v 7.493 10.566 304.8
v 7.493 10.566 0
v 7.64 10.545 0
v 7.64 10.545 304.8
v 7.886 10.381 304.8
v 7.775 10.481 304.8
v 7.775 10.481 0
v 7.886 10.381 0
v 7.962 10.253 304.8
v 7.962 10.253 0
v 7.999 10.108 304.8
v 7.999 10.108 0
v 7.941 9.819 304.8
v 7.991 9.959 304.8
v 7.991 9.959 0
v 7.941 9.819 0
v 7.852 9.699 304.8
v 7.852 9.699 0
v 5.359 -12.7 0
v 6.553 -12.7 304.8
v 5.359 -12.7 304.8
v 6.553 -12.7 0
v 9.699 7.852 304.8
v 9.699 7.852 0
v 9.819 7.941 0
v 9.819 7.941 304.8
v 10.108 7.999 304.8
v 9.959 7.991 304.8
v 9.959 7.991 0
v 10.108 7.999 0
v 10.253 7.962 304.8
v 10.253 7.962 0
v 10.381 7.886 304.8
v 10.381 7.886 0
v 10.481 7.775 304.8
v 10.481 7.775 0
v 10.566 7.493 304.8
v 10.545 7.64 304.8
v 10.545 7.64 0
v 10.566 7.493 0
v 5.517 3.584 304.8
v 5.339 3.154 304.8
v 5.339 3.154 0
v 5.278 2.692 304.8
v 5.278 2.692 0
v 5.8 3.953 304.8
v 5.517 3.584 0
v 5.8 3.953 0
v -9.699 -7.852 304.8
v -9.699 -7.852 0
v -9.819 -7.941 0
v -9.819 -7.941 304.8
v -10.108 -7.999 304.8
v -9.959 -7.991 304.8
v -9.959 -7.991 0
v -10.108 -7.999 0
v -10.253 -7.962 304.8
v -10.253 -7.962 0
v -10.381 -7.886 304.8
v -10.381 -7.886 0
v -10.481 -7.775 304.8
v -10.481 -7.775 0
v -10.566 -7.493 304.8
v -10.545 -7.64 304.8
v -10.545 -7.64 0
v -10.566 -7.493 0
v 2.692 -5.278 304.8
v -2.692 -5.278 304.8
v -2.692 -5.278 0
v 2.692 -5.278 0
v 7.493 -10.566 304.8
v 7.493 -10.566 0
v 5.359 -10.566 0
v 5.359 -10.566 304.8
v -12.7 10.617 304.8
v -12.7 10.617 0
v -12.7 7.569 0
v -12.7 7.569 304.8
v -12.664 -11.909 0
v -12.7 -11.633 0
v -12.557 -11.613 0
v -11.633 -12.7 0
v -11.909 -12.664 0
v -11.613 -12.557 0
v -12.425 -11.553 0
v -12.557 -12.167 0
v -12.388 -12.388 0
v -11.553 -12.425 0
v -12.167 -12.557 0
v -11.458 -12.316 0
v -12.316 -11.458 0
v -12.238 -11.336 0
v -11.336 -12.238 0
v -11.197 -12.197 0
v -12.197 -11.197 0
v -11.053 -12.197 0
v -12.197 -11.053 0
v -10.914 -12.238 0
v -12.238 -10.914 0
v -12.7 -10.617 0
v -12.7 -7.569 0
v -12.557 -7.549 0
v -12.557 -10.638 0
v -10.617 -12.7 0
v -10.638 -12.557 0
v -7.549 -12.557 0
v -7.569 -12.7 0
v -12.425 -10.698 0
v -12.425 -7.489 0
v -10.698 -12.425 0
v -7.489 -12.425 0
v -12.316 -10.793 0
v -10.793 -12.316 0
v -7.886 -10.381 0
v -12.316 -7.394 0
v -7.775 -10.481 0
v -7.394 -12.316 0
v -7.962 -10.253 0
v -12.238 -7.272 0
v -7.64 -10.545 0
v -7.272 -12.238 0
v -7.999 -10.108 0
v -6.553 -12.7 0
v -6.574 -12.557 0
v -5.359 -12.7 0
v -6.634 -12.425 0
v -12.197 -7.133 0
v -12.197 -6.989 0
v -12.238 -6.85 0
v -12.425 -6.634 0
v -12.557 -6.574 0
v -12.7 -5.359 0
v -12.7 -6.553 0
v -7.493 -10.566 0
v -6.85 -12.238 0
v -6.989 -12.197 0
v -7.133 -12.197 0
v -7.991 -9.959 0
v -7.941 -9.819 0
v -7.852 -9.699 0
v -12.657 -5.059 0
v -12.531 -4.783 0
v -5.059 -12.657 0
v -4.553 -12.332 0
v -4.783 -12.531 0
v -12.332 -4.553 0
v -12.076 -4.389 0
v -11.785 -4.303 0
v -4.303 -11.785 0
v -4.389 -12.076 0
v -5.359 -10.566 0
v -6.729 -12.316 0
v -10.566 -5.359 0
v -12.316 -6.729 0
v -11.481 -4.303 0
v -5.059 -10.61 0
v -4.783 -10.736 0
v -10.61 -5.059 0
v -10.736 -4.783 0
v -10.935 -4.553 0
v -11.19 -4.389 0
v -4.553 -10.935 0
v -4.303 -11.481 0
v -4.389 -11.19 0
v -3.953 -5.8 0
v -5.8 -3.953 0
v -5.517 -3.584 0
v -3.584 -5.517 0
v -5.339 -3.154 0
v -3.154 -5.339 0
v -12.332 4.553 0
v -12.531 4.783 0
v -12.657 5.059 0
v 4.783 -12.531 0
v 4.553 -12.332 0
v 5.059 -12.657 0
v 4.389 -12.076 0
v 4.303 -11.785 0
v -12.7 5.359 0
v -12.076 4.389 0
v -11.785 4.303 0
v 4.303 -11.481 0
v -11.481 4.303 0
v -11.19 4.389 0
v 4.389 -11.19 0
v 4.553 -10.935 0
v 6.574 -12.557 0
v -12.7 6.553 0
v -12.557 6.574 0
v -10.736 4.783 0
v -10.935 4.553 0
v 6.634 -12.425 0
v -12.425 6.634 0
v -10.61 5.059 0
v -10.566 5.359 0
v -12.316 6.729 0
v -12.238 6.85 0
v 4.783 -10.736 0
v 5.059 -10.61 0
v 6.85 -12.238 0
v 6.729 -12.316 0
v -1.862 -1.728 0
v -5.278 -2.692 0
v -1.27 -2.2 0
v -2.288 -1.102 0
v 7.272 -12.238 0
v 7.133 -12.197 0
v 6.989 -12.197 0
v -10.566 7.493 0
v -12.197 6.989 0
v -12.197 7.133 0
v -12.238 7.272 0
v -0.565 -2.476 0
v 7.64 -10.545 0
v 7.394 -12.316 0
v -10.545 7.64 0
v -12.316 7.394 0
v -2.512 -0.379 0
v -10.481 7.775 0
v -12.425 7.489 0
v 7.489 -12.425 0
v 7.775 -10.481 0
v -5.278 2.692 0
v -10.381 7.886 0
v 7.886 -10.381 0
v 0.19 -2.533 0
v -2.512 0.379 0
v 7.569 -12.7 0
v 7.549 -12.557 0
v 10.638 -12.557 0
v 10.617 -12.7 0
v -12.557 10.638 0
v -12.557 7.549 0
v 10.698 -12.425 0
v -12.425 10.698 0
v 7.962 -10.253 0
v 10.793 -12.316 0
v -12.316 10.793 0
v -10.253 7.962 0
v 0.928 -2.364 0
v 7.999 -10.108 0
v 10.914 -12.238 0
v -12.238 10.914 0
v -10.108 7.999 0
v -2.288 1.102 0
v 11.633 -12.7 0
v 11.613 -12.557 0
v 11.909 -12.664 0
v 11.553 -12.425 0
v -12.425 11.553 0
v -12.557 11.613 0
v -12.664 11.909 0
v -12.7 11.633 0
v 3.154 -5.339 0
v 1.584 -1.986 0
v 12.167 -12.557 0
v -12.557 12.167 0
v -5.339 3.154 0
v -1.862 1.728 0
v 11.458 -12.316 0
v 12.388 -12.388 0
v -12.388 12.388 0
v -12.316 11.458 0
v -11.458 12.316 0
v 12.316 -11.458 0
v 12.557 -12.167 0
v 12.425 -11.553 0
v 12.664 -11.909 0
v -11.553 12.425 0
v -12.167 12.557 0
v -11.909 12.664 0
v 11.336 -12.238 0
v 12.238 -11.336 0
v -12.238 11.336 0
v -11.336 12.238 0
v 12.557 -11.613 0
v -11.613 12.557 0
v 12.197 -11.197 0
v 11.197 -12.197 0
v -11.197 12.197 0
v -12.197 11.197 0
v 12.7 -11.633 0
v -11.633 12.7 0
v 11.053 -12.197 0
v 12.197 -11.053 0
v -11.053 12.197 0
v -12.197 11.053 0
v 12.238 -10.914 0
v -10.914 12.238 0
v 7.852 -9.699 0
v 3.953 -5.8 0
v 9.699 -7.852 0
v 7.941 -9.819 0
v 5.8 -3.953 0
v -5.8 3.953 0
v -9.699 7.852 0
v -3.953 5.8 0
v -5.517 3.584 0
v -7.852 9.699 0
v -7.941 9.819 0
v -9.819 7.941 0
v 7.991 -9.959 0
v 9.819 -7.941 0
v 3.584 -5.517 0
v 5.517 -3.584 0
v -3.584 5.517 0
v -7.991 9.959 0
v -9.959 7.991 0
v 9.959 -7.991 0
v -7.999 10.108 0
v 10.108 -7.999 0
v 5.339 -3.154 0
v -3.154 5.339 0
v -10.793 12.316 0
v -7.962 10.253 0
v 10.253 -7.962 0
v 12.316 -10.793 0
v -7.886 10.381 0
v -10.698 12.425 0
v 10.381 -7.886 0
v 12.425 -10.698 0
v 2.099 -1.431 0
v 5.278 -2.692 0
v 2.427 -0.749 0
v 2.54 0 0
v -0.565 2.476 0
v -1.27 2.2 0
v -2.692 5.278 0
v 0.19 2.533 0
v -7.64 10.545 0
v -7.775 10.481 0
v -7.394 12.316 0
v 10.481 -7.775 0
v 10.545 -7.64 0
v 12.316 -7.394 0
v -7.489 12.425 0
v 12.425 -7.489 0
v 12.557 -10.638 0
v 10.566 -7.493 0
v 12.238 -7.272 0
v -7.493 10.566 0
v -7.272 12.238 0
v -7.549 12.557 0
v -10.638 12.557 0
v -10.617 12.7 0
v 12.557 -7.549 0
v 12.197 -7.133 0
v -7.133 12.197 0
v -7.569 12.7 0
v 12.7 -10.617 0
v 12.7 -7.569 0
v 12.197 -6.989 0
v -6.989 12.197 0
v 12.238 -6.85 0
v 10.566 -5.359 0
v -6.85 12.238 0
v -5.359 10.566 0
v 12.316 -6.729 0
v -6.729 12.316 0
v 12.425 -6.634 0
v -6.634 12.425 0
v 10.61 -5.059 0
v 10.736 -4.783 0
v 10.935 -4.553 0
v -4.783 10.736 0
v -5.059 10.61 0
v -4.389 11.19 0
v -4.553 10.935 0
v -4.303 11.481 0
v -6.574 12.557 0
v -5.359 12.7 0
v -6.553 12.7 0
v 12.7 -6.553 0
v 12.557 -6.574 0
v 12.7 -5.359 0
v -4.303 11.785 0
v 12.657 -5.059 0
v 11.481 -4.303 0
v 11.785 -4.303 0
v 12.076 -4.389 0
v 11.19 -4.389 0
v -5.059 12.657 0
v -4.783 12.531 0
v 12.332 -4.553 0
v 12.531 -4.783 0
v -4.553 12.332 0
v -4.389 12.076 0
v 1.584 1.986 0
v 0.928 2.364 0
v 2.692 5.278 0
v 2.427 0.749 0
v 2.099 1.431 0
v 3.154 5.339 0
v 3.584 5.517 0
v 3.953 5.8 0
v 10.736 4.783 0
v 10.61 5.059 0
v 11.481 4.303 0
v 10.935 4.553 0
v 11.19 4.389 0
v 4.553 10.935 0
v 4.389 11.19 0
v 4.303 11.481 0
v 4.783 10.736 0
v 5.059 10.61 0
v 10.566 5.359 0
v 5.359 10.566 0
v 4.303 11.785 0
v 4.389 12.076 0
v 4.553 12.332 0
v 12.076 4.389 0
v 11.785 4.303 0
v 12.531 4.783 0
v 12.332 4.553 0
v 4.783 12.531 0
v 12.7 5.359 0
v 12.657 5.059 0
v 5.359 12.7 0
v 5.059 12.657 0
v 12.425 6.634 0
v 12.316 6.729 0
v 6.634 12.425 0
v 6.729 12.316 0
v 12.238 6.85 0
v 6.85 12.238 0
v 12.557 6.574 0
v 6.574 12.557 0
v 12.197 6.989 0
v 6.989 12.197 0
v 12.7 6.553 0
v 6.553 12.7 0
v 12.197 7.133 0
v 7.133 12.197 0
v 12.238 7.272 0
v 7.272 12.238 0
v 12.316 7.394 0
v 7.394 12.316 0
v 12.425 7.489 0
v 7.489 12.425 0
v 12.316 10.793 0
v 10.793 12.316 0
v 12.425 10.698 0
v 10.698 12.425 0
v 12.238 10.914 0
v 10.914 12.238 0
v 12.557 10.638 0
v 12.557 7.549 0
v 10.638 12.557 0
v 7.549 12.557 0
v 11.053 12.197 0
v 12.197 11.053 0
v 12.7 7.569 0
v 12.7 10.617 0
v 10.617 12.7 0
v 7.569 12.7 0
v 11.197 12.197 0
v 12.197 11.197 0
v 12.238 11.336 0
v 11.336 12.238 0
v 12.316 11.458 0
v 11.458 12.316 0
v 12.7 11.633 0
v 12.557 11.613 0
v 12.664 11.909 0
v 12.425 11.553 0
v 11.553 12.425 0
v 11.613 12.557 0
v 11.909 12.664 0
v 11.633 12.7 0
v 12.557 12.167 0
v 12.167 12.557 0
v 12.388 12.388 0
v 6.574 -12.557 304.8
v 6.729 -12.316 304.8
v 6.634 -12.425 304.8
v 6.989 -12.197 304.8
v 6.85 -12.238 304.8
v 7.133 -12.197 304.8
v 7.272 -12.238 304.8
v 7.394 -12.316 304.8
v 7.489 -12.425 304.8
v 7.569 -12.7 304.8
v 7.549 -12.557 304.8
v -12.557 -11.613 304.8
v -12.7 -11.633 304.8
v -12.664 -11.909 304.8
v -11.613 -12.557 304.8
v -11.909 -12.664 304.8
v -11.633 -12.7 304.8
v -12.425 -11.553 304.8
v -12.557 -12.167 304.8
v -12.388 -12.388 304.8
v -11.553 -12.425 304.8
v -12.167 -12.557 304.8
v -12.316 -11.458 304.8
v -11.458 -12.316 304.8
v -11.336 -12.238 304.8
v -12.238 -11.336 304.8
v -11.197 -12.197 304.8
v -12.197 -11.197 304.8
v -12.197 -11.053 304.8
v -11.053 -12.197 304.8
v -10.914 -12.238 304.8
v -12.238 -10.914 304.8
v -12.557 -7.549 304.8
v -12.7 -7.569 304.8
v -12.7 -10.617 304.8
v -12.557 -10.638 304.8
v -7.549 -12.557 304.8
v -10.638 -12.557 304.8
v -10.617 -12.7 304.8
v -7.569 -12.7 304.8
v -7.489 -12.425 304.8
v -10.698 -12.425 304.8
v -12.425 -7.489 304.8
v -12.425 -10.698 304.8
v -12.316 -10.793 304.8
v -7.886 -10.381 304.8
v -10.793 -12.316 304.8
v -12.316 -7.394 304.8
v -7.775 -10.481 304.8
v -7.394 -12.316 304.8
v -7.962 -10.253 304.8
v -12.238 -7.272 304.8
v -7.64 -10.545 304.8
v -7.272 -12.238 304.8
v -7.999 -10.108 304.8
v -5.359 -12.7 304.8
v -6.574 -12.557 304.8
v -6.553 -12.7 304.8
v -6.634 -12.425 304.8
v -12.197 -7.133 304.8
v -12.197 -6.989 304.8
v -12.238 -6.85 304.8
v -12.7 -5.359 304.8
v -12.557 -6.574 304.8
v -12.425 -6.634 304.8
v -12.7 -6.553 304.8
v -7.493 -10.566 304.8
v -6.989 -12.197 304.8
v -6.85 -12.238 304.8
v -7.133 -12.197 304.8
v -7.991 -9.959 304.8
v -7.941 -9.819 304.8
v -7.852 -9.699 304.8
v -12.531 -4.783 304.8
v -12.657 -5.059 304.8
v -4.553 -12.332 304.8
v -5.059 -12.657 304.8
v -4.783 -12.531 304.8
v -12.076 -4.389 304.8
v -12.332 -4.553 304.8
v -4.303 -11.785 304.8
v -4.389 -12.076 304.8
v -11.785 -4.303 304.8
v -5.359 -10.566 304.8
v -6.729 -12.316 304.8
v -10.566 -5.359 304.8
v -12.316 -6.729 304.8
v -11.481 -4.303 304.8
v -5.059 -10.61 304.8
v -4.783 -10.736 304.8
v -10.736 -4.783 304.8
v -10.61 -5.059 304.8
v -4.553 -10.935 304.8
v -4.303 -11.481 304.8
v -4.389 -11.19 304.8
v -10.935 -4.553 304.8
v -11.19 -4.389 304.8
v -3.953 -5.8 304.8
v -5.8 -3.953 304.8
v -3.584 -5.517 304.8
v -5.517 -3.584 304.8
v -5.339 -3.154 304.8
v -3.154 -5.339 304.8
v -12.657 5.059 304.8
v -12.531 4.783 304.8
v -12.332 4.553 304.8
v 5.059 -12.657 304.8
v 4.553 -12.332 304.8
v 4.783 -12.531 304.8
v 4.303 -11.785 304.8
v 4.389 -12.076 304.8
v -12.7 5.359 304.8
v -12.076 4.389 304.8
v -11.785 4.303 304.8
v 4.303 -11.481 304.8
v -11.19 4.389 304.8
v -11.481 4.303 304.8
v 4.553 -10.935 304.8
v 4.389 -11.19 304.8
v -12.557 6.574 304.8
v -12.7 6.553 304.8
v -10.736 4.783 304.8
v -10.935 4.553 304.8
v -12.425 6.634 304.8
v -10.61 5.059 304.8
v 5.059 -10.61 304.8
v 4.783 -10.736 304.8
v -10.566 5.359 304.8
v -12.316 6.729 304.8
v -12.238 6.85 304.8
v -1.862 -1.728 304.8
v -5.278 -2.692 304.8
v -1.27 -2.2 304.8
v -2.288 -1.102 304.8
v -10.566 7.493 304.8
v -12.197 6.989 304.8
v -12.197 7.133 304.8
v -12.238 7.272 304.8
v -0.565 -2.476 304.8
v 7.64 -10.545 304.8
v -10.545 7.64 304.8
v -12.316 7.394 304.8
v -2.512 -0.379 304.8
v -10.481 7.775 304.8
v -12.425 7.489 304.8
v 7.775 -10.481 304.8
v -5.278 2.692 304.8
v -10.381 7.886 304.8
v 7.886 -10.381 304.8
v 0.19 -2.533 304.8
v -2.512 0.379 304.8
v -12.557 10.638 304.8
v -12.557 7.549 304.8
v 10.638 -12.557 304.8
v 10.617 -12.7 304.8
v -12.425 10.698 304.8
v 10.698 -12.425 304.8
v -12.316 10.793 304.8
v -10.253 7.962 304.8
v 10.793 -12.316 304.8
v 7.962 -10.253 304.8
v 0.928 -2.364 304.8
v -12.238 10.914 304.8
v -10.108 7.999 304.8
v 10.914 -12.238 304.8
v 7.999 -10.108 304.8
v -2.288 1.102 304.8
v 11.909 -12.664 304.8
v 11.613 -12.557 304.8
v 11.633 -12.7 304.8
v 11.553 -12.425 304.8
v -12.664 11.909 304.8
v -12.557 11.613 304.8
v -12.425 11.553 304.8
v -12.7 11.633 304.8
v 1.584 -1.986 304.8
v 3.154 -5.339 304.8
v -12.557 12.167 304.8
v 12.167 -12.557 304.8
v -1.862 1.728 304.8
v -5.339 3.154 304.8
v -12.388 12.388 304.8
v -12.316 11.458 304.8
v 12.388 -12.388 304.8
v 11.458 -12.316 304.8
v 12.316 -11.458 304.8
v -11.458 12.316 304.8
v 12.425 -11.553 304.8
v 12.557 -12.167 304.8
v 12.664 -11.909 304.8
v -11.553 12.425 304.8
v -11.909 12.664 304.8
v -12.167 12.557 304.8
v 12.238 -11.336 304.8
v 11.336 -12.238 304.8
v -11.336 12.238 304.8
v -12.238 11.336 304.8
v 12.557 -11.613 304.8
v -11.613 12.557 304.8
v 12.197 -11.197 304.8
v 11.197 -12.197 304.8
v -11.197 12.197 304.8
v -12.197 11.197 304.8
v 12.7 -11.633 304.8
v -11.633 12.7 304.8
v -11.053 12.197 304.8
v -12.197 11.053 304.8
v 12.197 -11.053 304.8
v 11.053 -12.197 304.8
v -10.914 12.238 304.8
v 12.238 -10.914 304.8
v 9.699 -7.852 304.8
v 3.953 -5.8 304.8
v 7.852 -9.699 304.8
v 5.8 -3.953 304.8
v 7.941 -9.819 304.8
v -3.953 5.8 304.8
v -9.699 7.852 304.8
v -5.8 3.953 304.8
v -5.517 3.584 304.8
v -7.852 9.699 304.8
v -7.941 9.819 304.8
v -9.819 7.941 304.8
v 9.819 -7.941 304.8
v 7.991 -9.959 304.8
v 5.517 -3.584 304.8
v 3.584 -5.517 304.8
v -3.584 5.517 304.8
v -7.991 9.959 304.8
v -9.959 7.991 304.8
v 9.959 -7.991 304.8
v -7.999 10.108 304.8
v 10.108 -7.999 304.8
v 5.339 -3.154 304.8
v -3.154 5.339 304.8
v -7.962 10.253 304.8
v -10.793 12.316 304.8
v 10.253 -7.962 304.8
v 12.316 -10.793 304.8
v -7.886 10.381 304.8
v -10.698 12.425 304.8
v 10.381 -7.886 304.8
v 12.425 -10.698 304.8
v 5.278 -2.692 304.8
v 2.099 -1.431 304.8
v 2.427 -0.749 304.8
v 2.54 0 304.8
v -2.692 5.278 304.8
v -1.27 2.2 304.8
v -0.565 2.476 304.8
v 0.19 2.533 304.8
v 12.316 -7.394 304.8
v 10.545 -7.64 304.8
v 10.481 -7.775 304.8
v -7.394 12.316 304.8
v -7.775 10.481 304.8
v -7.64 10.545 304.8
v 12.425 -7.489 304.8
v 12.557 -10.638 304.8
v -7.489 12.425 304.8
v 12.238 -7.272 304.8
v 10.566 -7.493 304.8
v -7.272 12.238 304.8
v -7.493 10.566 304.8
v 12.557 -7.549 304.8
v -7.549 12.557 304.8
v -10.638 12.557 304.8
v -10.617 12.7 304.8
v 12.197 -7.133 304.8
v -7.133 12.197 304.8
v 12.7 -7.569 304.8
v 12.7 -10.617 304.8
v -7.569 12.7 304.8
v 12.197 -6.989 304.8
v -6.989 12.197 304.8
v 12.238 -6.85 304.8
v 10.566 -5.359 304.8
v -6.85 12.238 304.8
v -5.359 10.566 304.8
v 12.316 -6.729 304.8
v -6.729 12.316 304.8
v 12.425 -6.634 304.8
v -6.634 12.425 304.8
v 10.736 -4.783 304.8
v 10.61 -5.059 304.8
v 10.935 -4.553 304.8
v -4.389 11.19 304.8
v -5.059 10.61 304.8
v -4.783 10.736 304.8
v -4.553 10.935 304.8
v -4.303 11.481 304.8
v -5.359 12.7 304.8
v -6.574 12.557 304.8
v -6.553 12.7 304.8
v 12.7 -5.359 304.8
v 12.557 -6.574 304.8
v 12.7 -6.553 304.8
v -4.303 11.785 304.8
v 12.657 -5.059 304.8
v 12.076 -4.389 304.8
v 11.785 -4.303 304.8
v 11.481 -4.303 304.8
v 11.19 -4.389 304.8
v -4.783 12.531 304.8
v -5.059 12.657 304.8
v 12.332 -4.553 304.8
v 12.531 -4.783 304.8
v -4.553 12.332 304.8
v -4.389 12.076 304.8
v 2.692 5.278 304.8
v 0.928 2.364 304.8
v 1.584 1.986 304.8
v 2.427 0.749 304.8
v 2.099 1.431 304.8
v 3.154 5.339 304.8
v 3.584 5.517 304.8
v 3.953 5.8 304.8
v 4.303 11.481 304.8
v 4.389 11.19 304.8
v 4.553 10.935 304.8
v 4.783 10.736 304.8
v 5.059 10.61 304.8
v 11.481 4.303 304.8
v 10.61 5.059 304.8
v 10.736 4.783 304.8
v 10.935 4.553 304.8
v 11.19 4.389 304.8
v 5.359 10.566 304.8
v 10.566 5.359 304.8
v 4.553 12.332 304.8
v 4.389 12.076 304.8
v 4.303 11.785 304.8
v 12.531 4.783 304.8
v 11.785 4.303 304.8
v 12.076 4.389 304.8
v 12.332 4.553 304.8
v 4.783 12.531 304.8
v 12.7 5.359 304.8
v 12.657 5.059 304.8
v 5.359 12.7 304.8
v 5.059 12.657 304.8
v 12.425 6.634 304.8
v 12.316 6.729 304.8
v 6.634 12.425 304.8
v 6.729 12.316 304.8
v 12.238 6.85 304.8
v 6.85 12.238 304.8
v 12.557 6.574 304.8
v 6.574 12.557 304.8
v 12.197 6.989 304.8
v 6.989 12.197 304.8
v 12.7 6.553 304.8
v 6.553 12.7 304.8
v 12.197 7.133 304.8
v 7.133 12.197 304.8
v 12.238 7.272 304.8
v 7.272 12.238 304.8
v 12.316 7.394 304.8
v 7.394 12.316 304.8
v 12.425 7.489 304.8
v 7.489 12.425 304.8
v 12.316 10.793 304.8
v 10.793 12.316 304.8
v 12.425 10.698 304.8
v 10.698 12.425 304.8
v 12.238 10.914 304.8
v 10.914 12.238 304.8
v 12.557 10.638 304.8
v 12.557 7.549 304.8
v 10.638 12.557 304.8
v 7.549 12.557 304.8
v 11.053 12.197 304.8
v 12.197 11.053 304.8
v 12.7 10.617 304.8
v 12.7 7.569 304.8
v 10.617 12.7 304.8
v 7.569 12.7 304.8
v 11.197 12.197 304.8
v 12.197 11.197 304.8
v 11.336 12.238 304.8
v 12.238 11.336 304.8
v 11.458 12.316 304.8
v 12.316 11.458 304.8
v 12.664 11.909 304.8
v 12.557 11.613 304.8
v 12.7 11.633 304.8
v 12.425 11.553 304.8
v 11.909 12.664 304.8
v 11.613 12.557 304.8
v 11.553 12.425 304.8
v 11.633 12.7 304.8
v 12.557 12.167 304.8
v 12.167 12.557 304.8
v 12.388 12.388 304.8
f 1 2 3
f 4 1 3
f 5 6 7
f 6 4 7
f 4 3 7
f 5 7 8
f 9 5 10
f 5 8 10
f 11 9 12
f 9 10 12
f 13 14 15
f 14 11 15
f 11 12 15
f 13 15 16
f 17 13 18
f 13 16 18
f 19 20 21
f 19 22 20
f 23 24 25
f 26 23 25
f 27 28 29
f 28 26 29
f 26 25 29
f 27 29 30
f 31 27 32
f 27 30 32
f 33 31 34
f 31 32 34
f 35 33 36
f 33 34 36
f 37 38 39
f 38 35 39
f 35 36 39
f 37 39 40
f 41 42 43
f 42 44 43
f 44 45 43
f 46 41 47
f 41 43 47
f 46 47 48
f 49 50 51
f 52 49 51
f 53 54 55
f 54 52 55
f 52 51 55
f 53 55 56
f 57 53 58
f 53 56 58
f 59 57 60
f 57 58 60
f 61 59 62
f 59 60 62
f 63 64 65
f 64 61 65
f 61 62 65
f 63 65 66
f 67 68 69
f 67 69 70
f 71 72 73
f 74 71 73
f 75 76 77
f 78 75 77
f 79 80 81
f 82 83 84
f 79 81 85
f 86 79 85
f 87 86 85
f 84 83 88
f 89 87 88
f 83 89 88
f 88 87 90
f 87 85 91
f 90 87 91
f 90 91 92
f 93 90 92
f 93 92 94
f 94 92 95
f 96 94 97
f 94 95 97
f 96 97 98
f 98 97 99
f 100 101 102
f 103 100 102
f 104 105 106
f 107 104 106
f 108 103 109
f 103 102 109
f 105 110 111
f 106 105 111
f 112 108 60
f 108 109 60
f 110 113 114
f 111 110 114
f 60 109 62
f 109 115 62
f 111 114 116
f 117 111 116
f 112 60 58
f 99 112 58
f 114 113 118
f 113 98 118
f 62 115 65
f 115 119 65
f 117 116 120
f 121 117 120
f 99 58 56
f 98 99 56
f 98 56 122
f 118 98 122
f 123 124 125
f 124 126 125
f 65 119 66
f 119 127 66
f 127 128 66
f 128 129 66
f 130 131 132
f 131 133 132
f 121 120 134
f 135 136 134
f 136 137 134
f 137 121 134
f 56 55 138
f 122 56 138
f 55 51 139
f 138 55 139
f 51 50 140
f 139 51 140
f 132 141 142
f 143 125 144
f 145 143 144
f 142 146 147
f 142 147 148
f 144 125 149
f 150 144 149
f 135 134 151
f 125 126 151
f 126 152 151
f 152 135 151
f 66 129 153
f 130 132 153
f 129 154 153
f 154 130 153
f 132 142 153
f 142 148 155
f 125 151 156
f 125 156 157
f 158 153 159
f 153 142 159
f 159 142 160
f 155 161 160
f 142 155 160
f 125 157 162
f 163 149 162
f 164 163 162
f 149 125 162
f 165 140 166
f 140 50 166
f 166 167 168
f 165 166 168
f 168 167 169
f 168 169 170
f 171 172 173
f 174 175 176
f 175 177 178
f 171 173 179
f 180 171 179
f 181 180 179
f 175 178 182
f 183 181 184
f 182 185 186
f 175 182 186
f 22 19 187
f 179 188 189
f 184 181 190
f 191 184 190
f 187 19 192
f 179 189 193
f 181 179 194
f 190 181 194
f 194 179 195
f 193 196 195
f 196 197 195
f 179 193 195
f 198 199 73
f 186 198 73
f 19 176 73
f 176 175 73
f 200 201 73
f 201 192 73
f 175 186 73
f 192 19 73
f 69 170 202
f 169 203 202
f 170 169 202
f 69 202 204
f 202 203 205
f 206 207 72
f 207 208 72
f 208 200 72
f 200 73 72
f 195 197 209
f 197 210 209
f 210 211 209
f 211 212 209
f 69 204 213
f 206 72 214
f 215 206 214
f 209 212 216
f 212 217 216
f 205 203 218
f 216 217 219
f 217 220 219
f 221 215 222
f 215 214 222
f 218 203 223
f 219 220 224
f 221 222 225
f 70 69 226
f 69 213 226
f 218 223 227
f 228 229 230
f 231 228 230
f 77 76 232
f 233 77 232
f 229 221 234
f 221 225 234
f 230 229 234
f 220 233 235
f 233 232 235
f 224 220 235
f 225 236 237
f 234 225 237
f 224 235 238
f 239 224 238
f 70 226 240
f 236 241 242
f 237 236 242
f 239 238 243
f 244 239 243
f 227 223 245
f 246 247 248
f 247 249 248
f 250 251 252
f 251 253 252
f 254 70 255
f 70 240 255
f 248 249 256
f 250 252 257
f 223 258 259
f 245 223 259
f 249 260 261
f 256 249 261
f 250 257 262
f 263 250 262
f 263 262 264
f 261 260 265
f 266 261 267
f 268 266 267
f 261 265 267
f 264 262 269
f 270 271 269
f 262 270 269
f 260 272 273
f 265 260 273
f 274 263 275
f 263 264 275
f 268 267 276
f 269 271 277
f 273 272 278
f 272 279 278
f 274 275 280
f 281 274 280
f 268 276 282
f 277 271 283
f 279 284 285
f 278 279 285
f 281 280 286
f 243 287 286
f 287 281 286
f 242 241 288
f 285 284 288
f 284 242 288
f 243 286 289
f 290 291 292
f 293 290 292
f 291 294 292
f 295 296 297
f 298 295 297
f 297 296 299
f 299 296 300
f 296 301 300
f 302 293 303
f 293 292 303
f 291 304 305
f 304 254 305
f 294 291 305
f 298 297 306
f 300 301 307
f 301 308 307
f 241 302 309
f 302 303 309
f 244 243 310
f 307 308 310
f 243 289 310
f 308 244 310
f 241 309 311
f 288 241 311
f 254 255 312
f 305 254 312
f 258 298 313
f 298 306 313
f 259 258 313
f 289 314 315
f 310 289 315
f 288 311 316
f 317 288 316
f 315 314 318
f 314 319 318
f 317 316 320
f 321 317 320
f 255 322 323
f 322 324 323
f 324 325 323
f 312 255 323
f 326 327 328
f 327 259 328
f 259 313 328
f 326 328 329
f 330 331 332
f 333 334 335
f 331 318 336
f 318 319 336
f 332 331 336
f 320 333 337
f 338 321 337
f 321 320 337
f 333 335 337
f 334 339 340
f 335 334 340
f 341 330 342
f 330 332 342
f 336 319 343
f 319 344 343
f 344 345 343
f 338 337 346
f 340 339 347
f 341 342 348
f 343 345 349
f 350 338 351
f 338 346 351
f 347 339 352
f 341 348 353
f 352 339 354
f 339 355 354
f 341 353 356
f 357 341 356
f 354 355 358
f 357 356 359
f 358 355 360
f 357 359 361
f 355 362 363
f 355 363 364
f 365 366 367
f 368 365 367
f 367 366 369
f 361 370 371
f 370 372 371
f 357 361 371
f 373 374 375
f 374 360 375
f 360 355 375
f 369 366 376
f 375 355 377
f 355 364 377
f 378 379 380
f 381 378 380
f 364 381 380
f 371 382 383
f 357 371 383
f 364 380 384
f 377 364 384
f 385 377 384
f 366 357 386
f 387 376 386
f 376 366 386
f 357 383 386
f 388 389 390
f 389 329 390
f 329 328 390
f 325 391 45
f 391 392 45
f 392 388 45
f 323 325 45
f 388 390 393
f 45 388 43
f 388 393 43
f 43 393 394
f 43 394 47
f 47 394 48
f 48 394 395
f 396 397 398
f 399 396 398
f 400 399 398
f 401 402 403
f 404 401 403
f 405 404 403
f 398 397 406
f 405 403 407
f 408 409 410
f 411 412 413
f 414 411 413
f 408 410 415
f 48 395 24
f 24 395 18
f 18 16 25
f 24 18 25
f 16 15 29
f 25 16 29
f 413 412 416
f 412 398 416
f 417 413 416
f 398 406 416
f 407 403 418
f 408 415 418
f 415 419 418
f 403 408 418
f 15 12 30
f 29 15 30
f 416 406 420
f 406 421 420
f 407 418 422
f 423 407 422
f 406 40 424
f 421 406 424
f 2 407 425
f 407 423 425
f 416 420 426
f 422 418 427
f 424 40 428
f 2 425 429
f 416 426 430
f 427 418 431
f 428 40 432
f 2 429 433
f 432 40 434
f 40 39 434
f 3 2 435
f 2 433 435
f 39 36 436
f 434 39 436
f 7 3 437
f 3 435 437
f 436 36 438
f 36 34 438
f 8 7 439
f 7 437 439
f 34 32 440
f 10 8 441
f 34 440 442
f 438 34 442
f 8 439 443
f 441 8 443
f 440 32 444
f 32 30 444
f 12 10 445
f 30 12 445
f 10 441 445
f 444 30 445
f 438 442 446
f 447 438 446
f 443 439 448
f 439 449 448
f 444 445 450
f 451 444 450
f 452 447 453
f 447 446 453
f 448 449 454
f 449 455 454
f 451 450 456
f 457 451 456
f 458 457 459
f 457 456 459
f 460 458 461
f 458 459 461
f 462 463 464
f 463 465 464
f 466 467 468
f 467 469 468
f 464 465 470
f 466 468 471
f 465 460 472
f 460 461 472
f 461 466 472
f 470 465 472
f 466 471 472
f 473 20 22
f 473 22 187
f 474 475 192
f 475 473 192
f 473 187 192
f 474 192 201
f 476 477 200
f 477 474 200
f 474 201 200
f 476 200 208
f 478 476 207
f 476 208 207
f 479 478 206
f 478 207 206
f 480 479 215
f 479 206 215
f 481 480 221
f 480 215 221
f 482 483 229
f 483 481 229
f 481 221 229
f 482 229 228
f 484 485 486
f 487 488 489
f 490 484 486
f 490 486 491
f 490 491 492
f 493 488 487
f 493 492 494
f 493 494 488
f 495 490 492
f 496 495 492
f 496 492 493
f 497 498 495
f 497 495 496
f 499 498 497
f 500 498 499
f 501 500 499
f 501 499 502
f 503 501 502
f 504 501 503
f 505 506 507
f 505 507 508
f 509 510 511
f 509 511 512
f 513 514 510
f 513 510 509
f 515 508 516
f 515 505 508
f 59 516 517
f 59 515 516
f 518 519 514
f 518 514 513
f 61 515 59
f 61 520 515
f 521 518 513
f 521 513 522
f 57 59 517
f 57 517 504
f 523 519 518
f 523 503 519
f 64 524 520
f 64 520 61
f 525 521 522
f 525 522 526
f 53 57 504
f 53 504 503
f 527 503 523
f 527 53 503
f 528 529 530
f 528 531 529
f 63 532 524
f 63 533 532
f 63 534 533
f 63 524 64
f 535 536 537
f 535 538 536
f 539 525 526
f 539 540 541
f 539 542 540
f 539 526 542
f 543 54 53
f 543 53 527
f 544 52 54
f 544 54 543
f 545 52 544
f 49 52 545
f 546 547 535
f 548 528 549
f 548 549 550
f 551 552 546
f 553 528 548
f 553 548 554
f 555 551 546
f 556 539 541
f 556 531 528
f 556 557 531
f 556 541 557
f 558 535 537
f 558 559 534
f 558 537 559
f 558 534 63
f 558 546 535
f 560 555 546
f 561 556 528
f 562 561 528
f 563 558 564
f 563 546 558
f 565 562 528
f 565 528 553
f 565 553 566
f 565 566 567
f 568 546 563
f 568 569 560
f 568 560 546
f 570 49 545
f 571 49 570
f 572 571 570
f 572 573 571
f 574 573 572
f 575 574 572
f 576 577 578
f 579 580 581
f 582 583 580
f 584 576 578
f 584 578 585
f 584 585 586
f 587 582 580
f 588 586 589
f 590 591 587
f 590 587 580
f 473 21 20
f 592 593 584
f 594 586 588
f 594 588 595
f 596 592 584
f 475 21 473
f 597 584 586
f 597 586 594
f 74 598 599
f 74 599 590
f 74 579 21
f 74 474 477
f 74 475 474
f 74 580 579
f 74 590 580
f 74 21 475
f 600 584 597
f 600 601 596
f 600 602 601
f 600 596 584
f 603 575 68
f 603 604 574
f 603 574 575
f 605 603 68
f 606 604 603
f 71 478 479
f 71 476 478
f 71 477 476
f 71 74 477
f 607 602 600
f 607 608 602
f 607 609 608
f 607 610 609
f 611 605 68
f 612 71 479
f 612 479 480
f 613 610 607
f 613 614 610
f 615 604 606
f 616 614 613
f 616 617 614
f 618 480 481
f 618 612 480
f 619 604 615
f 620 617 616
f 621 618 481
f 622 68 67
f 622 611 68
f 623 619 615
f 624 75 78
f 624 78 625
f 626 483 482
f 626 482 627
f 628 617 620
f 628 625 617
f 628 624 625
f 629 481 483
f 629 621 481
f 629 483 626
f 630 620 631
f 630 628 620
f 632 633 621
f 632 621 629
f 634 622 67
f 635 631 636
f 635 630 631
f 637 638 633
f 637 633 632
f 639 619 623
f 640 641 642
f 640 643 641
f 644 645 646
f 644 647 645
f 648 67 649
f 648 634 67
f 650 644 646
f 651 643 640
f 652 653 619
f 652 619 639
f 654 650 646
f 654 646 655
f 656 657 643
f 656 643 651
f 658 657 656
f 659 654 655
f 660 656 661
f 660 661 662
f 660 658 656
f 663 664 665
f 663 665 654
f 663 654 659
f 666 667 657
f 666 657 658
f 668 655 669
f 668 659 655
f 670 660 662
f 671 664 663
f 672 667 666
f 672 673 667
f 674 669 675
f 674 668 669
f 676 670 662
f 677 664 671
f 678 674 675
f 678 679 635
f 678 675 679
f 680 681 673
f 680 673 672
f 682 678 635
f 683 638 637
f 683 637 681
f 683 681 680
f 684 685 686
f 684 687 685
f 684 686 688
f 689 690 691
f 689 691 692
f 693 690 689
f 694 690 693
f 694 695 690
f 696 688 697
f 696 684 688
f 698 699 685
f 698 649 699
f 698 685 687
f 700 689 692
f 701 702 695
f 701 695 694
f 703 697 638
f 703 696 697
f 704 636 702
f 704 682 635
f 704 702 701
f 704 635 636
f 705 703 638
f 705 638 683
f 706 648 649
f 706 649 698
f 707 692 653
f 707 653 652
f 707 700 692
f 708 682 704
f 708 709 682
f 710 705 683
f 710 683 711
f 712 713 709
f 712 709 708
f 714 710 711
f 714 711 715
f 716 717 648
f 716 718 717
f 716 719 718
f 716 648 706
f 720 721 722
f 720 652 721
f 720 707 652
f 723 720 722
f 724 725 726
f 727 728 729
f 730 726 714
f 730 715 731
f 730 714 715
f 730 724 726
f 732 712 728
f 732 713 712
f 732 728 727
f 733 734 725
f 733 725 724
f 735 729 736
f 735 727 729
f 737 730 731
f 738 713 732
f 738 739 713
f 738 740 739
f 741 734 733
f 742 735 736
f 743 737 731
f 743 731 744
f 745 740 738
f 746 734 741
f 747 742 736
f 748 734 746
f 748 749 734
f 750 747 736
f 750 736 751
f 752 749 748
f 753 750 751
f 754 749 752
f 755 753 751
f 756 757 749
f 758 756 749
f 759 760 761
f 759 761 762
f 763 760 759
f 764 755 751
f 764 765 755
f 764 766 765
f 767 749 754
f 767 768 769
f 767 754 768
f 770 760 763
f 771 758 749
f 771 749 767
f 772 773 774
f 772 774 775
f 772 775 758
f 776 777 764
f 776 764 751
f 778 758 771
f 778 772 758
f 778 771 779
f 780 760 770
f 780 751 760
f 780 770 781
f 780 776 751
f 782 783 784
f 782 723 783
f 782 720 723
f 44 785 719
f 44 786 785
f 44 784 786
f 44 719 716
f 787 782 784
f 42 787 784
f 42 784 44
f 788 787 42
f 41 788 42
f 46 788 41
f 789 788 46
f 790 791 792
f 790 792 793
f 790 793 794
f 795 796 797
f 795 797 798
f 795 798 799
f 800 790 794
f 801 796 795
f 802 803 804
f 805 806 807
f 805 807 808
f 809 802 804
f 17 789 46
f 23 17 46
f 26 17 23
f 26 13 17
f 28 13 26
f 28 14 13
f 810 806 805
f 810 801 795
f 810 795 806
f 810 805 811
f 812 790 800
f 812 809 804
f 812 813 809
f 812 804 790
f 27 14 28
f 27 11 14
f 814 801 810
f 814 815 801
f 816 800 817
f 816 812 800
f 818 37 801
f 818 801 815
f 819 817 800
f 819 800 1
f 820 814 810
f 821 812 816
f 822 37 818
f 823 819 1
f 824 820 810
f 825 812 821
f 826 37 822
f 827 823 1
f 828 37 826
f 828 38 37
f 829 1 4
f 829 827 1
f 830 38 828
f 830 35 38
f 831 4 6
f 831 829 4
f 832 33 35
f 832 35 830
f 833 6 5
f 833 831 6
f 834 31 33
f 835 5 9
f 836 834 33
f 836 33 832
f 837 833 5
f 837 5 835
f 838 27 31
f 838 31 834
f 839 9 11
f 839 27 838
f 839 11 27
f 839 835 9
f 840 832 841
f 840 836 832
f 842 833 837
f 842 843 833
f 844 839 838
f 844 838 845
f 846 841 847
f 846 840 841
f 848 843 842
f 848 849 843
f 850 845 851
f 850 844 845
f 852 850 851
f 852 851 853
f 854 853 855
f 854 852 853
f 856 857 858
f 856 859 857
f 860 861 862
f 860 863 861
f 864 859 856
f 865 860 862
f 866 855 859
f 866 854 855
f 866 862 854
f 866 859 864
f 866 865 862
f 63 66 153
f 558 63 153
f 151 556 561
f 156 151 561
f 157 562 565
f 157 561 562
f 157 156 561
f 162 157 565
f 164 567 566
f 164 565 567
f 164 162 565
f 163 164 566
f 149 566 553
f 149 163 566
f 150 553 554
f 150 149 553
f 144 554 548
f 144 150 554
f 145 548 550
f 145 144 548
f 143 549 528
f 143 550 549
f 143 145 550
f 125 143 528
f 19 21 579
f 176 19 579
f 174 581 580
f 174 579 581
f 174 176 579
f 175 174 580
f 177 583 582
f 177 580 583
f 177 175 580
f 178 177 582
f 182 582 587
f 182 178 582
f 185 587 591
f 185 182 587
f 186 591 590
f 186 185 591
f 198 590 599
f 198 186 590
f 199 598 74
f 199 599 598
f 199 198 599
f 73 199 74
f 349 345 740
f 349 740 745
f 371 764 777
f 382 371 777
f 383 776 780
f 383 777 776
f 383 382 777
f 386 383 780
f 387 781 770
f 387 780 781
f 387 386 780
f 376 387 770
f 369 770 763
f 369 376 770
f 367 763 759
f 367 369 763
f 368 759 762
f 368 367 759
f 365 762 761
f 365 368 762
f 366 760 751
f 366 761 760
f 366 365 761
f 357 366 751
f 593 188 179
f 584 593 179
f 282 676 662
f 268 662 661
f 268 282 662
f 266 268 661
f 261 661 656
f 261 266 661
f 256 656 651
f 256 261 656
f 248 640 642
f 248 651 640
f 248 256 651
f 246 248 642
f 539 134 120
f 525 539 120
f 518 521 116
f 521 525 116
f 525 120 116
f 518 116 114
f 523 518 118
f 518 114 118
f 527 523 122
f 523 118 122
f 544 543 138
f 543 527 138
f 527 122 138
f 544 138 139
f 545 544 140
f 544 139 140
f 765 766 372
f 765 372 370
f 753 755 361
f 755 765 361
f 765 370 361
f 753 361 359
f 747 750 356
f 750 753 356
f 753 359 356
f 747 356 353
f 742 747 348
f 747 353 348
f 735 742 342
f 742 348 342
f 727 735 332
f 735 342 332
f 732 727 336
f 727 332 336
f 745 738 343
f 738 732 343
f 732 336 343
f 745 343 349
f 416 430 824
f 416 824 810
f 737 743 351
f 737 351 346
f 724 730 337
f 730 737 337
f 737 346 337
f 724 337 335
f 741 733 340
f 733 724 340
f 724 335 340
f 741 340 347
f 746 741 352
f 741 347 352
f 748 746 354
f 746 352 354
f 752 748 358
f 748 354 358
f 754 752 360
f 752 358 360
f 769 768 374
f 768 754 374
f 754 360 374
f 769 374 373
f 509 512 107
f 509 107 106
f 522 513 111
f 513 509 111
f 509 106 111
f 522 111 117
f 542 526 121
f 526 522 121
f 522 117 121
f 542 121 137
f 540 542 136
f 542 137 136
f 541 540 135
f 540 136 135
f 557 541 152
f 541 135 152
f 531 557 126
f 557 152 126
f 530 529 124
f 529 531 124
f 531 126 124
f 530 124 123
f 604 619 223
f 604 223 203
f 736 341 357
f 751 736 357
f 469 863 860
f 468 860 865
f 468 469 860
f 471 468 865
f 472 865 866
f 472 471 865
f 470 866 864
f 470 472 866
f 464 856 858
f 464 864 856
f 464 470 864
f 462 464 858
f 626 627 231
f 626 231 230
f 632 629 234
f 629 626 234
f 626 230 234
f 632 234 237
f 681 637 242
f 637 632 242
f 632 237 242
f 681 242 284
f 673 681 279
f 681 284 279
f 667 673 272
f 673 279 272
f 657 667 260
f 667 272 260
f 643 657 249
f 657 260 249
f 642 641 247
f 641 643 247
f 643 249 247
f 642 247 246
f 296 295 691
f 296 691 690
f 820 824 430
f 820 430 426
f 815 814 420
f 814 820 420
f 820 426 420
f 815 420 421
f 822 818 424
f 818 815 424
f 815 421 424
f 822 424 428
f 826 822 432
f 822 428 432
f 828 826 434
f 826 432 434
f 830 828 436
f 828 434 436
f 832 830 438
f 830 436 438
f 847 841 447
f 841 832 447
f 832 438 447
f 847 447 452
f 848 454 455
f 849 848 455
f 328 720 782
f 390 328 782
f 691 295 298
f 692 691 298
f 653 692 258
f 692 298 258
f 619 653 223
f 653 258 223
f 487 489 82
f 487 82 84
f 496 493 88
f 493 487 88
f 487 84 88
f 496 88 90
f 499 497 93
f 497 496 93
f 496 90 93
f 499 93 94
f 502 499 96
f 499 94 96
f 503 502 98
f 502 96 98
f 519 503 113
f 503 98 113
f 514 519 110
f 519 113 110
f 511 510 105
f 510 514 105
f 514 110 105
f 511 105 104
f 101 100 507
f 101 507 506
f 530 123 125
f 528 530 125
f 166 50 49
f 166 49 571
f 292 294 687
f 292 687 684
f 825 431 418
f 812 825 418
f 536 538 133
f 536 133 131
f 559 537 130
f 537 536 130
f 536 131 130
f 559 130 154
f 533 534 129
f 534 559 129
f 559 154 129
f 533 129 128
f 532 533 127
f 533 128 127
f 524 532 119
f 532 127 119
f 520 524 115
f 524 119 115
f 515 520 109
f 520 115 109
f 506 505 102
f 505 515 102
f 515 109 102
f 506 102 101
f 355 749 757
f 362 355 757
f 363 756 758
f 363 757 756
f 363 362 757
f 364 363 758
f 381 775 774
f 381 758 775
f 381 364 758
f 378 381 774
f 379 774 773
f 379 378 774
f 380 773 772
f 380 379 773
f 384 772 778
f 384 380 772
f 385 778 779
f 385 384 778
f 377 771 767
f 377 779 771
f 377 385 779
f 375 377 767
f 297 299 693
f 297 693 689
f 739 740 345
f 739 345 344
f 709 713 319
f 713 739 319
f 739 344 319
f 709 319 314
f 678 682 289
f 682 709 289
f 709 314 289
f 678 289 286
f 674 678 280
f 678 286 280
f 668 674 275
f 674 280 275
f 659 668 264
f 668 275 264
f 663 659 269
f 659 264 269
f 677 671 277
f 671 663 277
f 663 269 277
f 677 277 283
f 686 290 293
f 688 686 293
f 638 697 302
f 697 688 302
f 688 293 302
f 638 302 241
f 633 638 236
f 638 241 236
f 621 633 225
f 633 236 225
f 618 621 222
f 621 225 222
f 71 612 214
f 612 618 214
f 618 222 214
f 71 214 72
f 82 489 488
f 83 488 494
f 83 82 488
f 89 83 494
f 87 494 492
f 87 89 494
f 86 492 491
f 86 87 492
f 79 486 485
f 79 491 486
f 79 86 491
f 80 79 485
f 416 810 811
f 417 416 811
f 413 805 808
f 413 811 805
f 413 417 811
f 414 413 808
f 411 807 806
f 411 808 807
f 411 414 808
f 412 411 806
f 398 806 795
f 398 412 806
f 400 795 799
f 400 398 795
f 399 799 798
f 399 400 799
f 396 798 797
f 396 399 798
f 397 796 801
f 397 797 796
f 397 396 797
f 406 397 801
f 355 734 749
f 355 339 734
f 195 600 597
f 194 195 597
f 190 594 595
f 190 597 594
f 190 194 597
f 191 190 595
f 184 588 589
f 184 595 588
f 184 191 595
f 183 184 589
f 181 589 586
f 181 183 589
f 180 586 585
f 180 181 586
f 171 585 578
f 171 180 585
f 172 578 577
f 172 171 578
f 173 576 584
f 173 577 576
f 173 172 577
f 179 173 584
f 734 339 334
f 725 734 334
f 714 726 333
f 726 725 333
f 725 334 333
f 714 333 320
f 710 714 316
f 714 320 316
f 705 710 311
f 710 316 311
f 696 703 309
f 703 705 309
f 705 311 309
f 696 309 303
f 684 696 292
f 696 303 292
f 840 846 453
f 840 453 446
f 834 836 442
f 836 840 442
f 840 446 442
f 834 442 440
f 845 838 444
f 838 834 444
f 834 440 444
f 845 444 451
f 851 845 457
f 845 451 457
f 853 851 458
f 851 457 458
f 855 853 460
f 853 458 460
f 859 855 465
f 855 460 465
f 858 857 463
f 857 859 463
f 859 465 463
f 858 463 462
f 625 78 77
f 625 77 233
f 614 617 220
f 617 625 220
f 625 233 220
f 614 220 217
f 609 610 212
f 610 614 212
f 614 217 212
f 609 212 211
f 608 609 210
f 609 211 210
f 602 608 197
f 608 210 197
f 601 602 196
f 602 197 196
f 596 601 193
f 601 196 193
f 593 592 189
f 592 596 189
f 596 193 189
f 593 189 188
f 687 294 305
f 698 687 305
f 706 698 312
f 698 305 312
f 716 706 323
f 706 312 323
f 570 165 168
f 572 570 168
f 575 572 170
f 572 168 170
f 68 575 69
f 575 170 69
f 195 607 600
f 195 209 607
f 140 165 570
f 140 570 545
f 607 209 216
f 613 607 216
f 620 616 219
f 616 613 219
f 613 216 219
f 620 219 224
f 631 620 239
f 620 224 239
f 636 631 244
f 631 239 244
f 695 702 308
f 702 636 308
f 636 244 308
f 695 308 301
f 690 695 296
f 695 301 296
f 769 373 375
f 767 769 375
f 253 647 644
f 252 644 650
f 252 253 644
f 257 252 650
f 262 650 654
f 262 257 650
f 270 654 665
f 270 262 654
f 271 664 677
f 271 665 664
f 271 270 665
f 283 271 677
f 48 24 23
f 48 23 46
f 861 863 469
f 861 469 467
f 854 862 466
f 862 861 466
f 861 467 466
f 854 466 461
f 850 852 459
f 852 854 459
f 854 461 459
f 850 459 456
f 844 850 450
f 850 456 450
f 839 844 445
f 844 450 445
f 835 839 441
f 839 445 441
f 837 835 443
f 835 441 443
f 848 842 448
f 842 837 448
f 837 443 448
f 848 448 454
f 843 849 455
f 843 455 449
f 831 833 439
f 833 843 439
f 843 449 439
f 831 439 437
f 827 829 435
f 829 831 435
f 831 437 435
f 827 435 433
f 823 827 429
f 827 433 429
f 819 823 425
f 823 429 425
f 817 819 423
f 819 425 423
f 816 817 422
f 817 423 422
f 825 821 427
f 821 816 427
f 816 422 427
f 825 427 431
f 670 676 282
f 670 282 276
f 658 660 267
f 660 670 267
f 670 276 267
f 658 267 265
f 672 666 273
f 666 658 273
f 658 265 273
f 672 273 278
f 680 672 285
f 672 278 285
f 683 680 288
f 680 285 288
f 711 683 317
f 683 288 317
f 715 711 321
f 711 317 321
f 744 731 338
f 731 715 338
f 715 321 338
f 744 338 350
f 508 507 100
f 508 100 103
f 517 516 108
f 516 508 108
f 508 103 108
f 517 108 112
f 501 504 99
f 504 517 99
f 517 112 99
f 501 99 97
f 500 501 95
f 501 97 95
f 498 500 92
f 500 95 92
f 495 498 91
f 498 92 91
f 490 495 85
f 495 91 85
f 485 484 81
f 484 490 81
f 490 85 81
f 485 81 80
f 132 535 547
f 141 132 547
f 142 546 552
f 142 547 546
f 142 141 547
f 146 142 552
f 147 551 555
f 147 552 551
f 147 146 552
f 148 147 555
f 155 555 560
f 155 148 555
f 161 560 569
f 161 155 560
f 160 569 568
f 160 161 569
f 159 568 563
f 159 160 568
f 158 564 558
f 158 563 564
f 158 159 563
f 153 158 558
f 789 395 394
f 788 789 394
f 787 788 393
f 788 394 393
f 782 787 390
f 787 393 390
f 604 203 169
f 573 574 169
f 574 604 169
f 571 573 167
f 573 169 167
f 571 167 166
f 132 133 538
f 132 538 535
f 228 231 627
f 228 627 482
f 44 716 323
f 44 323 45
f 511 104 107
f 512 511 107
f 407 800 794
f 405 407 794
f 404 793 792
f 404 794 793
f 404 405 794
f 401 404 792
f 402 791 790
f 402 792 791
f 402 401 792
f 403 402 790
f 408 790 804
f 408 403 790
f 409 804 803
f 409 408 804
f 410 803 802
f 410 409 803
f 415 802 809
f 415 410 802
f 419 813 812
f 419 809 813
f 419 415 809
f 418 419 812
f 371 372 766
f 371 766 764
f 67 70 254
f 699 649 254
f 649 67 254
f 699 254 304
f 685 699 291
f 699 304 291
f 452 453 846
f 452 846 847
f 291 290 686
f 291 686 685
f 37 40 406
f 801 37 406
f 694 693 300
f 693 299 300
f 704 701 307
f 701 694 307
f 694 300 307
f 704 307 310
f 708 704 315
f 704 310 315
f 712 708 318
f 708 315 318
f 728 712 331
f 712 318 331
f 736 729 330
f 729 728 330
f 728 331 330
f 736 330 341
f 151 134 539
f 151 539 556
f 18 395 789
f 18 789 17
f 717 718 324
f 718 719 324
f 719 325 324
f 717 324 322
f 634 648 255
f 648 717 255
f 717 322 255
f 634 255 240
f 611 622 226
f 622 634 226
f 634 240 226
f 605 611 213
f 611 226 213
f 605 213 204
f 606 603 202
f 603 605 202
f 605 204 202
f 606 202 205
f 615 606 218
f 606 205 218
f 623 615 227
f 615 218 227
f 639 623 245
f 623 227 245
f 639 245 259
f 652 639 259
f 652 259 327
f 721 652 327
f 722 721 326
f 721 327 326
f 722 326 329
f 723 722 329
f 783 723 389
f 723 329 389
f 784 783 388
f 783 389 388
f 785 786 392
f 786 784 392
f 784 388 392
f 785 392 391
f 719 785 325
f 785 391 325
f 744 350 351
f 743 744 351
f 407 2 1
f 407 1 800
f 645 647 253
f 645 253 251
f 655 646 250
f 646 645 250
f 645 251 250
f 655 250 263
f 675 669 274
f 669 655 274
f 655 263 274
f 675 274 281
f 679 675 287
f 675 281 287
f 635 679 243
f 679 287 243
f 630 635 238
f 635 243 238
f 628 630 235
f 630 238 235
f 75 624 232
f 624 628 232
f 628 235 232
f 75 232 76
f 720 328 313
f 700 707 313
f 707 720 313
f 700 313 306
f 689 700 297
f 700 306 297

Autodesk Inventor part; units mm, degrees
ref_plane "YZ Plane" through (0, 0, 0) normal (1, 0, 0) x (0, 1, 0)
ref_plane "Start Plane" through (0, 0, 0) normal (0, 0, 1) x (1, 0, 0)
ref_plane "End Plane" through (0, 0, 304.8) normal (0, 0, 1) x (1, 0, 0)
sketch "Sketch" plane through (0, 0, 0) normal (0, 0, 1) x (1, 0, 0)
  arc A0 (-11.6332, 12.7) -> (-12.7, 11.6332) centre (-11.6332, 11.6332) ccw
  arc A1 (-5.3594, 10.5664) -> (-5.3594, 12.7) centre (-5.3594, 11.6332) ccw
  arc A2 (-12.7, 5.3594) -> (-10.5664, 5.3594) centre (-11.6332, 5.3594) ccw
  line L0 (-10.5664, 7.493) -> (-10.5664, 5.3594)
  line L1 (-7.493, 10.5664) -> (-5.3594, 10.5664)
  arc A3 (-9.6992, 7.8522) -> (-10.5664, 7.493) centre (-10.0584, 7.493) ccw
  arc A4 (-7.493, 10.5664) -> (-7.8522, 9.6992) centre (-7.493, 10.0584) ccw
  line L2 (-11.6332, 11.6332) -> (0, 0) construction
  line L3 (-5.8003, 3.9533) -> (-9.6992, 7.8522)
  line L4 (-7.8522, 9.6992) -> (-3.9533, 5.8003)
  arc A5 (-3.9533, 5.8003) -> (-2.6924, 5.278) centre (-2.6924, 7.0612) ccw
  arc A6 (-5.278, 2.6924) -> (-5.8003, 3.9533) centre (-7.0612, 2.6924) ccw
  arc A7 (0, 2.54) -> (-2.54, 0) centre (0, 0) ccw construction
  line L5 (0, 0) -> (-12.7, 0) construction
  line L6 (0, 12.7) -> (0, 0) construction
  arc A8 (-11.6332, 12.7) -> (-10.6172, 12.7) centre (-11.1252, 12.7) ccw
  arc A9 (-7.5692, 12.7) -> (-6.5532, 12.7) centre (-7.0612, 12.7) ccw
  arc A10 (-12.7, 10.6172) -> (-12.7, 11.6332) centre (-12.7, 11.1252) ccw
  arc A11 (-12.7, 6.5532) -> (-12.7, 7.5692) centre (-12.7, 7.0612) ccw
  line L7 (-12.7, 10.6172) -> (-12.7, 7.5692)
  line L8 (-12.7, 6.5532) -> (-12.7, 5.3594)
  line L9 (-10.6172, 12.7) -> (-7.5692, 12.7)
  line L10 (-6.5532, 12.7) -> (-5.3594, 12.7)
  circle A12 centre (0, 0) radius 2.54
  arc A13 (-12.7, -11.6332) -> (-11.6332, -12.7) centre (-11.6332, -11.6332) ccw
  line L11 (-12.7, -10.6172) -> (-12.7, -7.5692)
  arc A14 (-10.5664, -7.493) -> (-9.6992, -7.8522) centre (-10.0584, -7.493) ccw
  line L12 (-9.6992, -7.8522) -> (-5.8003, -3.9533)
  line L13 (-11.6332, -11.6332) -> (0, 0) construction
  line L14 (-3.9533, -5.8003) -> (-7.8522, -9.6992)
  arc A15 (-7.8522, -9.6992) -> (-7.493, -10.5664) centre (-7.493, -10.0584) ccw
  line L15 (-10.6172, -12.7) -> (-7.5692, -12.7)
  line L16 (-7.493, -10.5664) -> (-5.3594, -10.5664)
  arc A16 (-6.5532, -12.7) -> (-7.5692, -12.7) centre (-7.0612, -12.7) ccw
  line L17 (-6.5532, -12.7) -> (-5.3594, -12.7)
  arc A17 (-5.3594, -12.7) -> (-5.3594, -10.5664) centre (-5.3594, -11.6332) ccw
  arc A18 (-10.6172, -12.7) -> (-11.6332, -12.7) centre (-11.1252, -12.7) ccw
  arc A19 (-12.7, -11.6332) -> (-12.7, -10.6172) centre (-12.7, -11.1252) ccw
  arc A20 (-2.6924, -5.278) -> (-3.9533, -5.8003) centre (-2.6924, -7.0612) ccw
  arc A21 (-5.8003, -3.9533) -> (-5.278, -2.6924) centre (-7.0612, -2.6924) ccw
  line L18 (-10.5664, -7.493) -> (-10.5664, -5.3594)
  line L19 (-12.7, -6.5532) -> (-12.7, -5.3594)
  arc A22 (-10.5664, -5.3594) -> (-12.7, -5.3594) centre (-11.6332, -5.3594) ccw
  arc A23 (-12.7, -7.5692) -> (-12.7, -6.5532) centre (-12.7, -7.0612) ccw
  arc A24 (11.6332, -12.7) -> (12.7, -11.6332) centre (11.6332, -11.6332) ccw
  line L20 (10.6172, -12.7) -> (7.5692, -12.7)
  arc A25 (7.493, -10.5664) -> (7.8522, -9.6992) centre (7.493, -10.0584) ccw
  line L21 (7.8522, -9.6992) -> (3.9533, -5.8003)
  line L22 (11.6332, -11.6332) -> (0, 0) construction
  line L23 (5.8003, -3.9533) -> (9.6992, -7.8522)
  arc A26 (9.6992, -7.8522) -> (10.5664, -7.493) centre (10.0584, -7.493) ccw
  line L24 (12.7, -10.6172) -> (12.7, -7.5692)
  line L25 (10.5664, -7.493) -> (10.5664, -5.3594)
  arc A27 (12.7, -6.5532) -> (12.7, -7.5692) centre (12.7, -7.0612) ccw
  line L26 (12.7, -6.5532) -> (12.7, -5.3594)
  arc A28 (12.7, -5.3594) -> (10.5664, -5.3594) centre (11.6332, -5.3594) ccw
  arc A29 (12.7, -10.6172) -> (12.7, -11.6332) centre (12.7, -11.1252) ccw
  arc A30 (11.6332, -12.7) -> (10.6172, -12.7) centre (11.1252, -12.7) ccw
  arc A31 (5.278, -2.6924) -> (5.8003, -3.9533) centre (7.0612, -2.6924) ccw
  arc A32 (3.9533, -5.8003) -> (2.6924, -5.278) centre (2.6924, -7.0612) ccw
  line L27 (7.493, -10.5664) -> (5.3594, -10.5664)
  line L28 (6.5532, -12.7) -> (5.3594, -12.7)
  arc A33 (5.3594, -10.5664) -> (5.3594, -12.7) centre (5.3594, -11.6332) ccw
  arc A34 (7.5692, -12.7) -> (6.5532, -12.7) centre (7.0612, -12.7) ccw
  arc A35 (12.7, 11.6332) -> (11.6332, 12.7) centre (11.6332, 11.6332) ccw
  line L29 (12.7, 10.6172) -> (12.7, 7.5692)
  arc A36 (10.5664, 7.493) -> (9.6992, 7.8522) centre (10.0584, 7.493) ccw
  line L30 (9.6992, 7.8522) -> (5.8003, 3.9533)
  line L31 (11.6332, 11.6332) -> (0, 0) construction
  line L32 (3.9533, 5.8003) -> (7.8522, 9.6992)
  arc A37 (7.8522, 9.6992) -> (7.493, 10.5664) centre (7.493, 10.0584) ccw
  line L33 (10.6172, 12.7) -> (7.5692, 12.7)
  line L34 (7.493, 10.5664) -> (5.3594, 10.5664)
  arc A38 (6.5532, 12.7) -> (7.5692, 12.7) centre (7.0612, 12.7) ccw
  line L35 (6.5532, 12.7) -> (5.3594, 12.7)
  arc A39 (5.3594, 12.7) -> (5.3594, 10.5664) centre (5.3594, 11.6332) ccw
  arc A40 (10.6172, 12.7) -> (11.6332, 12.7) centre (11.1252, 12.7) ccw
  arc A41 (12.7, 11.6332) -> (12.7, 10.6172) centre (12.7, 11.1252) ccw
  arc A42 (2.6924, 5.278) -> (3.9533, 5.8003) centre (2.6924, 7.0612) ccw
  arc A43 (5.8003, 3.9533) -> (5.278, 2.6924) centre (7.0612, 2.6924) ccw
  line L36 (10.5664, 7.493) -> (10.5664, 5.3594)
  line L37 (12.7, 6.5532) -> (12.7, 5.3594)
  arc A44 (10.5664, 5.3594) -> (12.7, 5.3594) centre (11.6332, 5.3594) ccw
  arc A45 (12.7, 7.5692) -> (12.7, 6.5532) centre (12.7, 7.0612) ccw
  line L38 (-2.6924, 5.278) -> (2.6924, 5.278)
  line L39 (-5.278, 2.6924) -> (-5.278, -2.6924)
  line L40 (-2.6924, -5.278) -> (2.6924, -5.278)
  line L41 (5.278, -2.6924) -> (5.278, 2.6924)
  point P0 (0, 0)
  point P1 (0, 0)
  dimension "d2" = 2.1336
  dimension "d3" = 6.2738
  dimension "d4" = 6.2738
  dimension "d5" = 1.0668
  dimension "d6" = 2.1336
  dimension "d7" = 2.1336
  dimension "d8" = 1.016
  dimension "d9" = 1.016
  dimension "d10" = 135
  dimension "d11" = 2.667
  dimension "d12" = 4.572
  dimension "d13" = 4.572
  dimension "d14" = 2.667
  dimension "d15" = 5.08
  dimension "d16" = 45
  dimension "d19" = 45
  dimension "d20" = 0.508
  dimension "d21" = 4.572
  dimension "d22" = 1.016
  dimension "d23" = 4.572
  dimension "d24" = 1.016
  dimension "d25" = 0.508
  dimension "d26" = 0.508
  dimension "d27" = 0.508
  dimension "d28" = 12.7
  dimension "d37" = 360
  dimension "d47" = 10.5664
  dimension "d48" = 12.7
extrude "Body" add sketch "Sketch" along normal up to surface (304.8 mm away) from surface at 0
sketch "Sketch2" plane through (0, 0, 0) normal (0, 0, 1) x (1, 0, 0)
  line L0 (0, 0) -> (10, 0)
ref_plane "Work Plane3" through (0, 0, 0) normal (0, -1, 0) x (1, 0, 0)
sketch "Sketch3" plane through (0, 0, 0) normal (0, -1, 0) x (1, 0, 0)
  line L0 (-2, 0) -> (12, 0)
  line L1 (-2, 304.8) -> (12, 304.8)
  dimension "d60" = 304.8
equation "\"d3\" = d4"
equation "\"d6\" = d7"
equation "\"d11\" = d14"
equation "\"d12\" = d13"
equation "\"d23\" = d21"
equation "\"d24\" = d30"
equation "\"d26\" = 0.5 * d24"
equation "\"d27\" = 0.5 * d22"
equation "\"Width\" = 2 * d28"
equation "\"Height\" = 2 * d48"
equation "\"G_OFFSET_START\" = 0"
equation "\"G_OFFSET_END\" = 0"
equation "\"d56\" = Length + G_OFFSET_END"
equation "\"G_L\" = 304.8"
equation "\"d30\" = 1.016"
equation "\"Length\" = 304.8"
properties part number "1010_80_20" material "Aluminum-6061"
